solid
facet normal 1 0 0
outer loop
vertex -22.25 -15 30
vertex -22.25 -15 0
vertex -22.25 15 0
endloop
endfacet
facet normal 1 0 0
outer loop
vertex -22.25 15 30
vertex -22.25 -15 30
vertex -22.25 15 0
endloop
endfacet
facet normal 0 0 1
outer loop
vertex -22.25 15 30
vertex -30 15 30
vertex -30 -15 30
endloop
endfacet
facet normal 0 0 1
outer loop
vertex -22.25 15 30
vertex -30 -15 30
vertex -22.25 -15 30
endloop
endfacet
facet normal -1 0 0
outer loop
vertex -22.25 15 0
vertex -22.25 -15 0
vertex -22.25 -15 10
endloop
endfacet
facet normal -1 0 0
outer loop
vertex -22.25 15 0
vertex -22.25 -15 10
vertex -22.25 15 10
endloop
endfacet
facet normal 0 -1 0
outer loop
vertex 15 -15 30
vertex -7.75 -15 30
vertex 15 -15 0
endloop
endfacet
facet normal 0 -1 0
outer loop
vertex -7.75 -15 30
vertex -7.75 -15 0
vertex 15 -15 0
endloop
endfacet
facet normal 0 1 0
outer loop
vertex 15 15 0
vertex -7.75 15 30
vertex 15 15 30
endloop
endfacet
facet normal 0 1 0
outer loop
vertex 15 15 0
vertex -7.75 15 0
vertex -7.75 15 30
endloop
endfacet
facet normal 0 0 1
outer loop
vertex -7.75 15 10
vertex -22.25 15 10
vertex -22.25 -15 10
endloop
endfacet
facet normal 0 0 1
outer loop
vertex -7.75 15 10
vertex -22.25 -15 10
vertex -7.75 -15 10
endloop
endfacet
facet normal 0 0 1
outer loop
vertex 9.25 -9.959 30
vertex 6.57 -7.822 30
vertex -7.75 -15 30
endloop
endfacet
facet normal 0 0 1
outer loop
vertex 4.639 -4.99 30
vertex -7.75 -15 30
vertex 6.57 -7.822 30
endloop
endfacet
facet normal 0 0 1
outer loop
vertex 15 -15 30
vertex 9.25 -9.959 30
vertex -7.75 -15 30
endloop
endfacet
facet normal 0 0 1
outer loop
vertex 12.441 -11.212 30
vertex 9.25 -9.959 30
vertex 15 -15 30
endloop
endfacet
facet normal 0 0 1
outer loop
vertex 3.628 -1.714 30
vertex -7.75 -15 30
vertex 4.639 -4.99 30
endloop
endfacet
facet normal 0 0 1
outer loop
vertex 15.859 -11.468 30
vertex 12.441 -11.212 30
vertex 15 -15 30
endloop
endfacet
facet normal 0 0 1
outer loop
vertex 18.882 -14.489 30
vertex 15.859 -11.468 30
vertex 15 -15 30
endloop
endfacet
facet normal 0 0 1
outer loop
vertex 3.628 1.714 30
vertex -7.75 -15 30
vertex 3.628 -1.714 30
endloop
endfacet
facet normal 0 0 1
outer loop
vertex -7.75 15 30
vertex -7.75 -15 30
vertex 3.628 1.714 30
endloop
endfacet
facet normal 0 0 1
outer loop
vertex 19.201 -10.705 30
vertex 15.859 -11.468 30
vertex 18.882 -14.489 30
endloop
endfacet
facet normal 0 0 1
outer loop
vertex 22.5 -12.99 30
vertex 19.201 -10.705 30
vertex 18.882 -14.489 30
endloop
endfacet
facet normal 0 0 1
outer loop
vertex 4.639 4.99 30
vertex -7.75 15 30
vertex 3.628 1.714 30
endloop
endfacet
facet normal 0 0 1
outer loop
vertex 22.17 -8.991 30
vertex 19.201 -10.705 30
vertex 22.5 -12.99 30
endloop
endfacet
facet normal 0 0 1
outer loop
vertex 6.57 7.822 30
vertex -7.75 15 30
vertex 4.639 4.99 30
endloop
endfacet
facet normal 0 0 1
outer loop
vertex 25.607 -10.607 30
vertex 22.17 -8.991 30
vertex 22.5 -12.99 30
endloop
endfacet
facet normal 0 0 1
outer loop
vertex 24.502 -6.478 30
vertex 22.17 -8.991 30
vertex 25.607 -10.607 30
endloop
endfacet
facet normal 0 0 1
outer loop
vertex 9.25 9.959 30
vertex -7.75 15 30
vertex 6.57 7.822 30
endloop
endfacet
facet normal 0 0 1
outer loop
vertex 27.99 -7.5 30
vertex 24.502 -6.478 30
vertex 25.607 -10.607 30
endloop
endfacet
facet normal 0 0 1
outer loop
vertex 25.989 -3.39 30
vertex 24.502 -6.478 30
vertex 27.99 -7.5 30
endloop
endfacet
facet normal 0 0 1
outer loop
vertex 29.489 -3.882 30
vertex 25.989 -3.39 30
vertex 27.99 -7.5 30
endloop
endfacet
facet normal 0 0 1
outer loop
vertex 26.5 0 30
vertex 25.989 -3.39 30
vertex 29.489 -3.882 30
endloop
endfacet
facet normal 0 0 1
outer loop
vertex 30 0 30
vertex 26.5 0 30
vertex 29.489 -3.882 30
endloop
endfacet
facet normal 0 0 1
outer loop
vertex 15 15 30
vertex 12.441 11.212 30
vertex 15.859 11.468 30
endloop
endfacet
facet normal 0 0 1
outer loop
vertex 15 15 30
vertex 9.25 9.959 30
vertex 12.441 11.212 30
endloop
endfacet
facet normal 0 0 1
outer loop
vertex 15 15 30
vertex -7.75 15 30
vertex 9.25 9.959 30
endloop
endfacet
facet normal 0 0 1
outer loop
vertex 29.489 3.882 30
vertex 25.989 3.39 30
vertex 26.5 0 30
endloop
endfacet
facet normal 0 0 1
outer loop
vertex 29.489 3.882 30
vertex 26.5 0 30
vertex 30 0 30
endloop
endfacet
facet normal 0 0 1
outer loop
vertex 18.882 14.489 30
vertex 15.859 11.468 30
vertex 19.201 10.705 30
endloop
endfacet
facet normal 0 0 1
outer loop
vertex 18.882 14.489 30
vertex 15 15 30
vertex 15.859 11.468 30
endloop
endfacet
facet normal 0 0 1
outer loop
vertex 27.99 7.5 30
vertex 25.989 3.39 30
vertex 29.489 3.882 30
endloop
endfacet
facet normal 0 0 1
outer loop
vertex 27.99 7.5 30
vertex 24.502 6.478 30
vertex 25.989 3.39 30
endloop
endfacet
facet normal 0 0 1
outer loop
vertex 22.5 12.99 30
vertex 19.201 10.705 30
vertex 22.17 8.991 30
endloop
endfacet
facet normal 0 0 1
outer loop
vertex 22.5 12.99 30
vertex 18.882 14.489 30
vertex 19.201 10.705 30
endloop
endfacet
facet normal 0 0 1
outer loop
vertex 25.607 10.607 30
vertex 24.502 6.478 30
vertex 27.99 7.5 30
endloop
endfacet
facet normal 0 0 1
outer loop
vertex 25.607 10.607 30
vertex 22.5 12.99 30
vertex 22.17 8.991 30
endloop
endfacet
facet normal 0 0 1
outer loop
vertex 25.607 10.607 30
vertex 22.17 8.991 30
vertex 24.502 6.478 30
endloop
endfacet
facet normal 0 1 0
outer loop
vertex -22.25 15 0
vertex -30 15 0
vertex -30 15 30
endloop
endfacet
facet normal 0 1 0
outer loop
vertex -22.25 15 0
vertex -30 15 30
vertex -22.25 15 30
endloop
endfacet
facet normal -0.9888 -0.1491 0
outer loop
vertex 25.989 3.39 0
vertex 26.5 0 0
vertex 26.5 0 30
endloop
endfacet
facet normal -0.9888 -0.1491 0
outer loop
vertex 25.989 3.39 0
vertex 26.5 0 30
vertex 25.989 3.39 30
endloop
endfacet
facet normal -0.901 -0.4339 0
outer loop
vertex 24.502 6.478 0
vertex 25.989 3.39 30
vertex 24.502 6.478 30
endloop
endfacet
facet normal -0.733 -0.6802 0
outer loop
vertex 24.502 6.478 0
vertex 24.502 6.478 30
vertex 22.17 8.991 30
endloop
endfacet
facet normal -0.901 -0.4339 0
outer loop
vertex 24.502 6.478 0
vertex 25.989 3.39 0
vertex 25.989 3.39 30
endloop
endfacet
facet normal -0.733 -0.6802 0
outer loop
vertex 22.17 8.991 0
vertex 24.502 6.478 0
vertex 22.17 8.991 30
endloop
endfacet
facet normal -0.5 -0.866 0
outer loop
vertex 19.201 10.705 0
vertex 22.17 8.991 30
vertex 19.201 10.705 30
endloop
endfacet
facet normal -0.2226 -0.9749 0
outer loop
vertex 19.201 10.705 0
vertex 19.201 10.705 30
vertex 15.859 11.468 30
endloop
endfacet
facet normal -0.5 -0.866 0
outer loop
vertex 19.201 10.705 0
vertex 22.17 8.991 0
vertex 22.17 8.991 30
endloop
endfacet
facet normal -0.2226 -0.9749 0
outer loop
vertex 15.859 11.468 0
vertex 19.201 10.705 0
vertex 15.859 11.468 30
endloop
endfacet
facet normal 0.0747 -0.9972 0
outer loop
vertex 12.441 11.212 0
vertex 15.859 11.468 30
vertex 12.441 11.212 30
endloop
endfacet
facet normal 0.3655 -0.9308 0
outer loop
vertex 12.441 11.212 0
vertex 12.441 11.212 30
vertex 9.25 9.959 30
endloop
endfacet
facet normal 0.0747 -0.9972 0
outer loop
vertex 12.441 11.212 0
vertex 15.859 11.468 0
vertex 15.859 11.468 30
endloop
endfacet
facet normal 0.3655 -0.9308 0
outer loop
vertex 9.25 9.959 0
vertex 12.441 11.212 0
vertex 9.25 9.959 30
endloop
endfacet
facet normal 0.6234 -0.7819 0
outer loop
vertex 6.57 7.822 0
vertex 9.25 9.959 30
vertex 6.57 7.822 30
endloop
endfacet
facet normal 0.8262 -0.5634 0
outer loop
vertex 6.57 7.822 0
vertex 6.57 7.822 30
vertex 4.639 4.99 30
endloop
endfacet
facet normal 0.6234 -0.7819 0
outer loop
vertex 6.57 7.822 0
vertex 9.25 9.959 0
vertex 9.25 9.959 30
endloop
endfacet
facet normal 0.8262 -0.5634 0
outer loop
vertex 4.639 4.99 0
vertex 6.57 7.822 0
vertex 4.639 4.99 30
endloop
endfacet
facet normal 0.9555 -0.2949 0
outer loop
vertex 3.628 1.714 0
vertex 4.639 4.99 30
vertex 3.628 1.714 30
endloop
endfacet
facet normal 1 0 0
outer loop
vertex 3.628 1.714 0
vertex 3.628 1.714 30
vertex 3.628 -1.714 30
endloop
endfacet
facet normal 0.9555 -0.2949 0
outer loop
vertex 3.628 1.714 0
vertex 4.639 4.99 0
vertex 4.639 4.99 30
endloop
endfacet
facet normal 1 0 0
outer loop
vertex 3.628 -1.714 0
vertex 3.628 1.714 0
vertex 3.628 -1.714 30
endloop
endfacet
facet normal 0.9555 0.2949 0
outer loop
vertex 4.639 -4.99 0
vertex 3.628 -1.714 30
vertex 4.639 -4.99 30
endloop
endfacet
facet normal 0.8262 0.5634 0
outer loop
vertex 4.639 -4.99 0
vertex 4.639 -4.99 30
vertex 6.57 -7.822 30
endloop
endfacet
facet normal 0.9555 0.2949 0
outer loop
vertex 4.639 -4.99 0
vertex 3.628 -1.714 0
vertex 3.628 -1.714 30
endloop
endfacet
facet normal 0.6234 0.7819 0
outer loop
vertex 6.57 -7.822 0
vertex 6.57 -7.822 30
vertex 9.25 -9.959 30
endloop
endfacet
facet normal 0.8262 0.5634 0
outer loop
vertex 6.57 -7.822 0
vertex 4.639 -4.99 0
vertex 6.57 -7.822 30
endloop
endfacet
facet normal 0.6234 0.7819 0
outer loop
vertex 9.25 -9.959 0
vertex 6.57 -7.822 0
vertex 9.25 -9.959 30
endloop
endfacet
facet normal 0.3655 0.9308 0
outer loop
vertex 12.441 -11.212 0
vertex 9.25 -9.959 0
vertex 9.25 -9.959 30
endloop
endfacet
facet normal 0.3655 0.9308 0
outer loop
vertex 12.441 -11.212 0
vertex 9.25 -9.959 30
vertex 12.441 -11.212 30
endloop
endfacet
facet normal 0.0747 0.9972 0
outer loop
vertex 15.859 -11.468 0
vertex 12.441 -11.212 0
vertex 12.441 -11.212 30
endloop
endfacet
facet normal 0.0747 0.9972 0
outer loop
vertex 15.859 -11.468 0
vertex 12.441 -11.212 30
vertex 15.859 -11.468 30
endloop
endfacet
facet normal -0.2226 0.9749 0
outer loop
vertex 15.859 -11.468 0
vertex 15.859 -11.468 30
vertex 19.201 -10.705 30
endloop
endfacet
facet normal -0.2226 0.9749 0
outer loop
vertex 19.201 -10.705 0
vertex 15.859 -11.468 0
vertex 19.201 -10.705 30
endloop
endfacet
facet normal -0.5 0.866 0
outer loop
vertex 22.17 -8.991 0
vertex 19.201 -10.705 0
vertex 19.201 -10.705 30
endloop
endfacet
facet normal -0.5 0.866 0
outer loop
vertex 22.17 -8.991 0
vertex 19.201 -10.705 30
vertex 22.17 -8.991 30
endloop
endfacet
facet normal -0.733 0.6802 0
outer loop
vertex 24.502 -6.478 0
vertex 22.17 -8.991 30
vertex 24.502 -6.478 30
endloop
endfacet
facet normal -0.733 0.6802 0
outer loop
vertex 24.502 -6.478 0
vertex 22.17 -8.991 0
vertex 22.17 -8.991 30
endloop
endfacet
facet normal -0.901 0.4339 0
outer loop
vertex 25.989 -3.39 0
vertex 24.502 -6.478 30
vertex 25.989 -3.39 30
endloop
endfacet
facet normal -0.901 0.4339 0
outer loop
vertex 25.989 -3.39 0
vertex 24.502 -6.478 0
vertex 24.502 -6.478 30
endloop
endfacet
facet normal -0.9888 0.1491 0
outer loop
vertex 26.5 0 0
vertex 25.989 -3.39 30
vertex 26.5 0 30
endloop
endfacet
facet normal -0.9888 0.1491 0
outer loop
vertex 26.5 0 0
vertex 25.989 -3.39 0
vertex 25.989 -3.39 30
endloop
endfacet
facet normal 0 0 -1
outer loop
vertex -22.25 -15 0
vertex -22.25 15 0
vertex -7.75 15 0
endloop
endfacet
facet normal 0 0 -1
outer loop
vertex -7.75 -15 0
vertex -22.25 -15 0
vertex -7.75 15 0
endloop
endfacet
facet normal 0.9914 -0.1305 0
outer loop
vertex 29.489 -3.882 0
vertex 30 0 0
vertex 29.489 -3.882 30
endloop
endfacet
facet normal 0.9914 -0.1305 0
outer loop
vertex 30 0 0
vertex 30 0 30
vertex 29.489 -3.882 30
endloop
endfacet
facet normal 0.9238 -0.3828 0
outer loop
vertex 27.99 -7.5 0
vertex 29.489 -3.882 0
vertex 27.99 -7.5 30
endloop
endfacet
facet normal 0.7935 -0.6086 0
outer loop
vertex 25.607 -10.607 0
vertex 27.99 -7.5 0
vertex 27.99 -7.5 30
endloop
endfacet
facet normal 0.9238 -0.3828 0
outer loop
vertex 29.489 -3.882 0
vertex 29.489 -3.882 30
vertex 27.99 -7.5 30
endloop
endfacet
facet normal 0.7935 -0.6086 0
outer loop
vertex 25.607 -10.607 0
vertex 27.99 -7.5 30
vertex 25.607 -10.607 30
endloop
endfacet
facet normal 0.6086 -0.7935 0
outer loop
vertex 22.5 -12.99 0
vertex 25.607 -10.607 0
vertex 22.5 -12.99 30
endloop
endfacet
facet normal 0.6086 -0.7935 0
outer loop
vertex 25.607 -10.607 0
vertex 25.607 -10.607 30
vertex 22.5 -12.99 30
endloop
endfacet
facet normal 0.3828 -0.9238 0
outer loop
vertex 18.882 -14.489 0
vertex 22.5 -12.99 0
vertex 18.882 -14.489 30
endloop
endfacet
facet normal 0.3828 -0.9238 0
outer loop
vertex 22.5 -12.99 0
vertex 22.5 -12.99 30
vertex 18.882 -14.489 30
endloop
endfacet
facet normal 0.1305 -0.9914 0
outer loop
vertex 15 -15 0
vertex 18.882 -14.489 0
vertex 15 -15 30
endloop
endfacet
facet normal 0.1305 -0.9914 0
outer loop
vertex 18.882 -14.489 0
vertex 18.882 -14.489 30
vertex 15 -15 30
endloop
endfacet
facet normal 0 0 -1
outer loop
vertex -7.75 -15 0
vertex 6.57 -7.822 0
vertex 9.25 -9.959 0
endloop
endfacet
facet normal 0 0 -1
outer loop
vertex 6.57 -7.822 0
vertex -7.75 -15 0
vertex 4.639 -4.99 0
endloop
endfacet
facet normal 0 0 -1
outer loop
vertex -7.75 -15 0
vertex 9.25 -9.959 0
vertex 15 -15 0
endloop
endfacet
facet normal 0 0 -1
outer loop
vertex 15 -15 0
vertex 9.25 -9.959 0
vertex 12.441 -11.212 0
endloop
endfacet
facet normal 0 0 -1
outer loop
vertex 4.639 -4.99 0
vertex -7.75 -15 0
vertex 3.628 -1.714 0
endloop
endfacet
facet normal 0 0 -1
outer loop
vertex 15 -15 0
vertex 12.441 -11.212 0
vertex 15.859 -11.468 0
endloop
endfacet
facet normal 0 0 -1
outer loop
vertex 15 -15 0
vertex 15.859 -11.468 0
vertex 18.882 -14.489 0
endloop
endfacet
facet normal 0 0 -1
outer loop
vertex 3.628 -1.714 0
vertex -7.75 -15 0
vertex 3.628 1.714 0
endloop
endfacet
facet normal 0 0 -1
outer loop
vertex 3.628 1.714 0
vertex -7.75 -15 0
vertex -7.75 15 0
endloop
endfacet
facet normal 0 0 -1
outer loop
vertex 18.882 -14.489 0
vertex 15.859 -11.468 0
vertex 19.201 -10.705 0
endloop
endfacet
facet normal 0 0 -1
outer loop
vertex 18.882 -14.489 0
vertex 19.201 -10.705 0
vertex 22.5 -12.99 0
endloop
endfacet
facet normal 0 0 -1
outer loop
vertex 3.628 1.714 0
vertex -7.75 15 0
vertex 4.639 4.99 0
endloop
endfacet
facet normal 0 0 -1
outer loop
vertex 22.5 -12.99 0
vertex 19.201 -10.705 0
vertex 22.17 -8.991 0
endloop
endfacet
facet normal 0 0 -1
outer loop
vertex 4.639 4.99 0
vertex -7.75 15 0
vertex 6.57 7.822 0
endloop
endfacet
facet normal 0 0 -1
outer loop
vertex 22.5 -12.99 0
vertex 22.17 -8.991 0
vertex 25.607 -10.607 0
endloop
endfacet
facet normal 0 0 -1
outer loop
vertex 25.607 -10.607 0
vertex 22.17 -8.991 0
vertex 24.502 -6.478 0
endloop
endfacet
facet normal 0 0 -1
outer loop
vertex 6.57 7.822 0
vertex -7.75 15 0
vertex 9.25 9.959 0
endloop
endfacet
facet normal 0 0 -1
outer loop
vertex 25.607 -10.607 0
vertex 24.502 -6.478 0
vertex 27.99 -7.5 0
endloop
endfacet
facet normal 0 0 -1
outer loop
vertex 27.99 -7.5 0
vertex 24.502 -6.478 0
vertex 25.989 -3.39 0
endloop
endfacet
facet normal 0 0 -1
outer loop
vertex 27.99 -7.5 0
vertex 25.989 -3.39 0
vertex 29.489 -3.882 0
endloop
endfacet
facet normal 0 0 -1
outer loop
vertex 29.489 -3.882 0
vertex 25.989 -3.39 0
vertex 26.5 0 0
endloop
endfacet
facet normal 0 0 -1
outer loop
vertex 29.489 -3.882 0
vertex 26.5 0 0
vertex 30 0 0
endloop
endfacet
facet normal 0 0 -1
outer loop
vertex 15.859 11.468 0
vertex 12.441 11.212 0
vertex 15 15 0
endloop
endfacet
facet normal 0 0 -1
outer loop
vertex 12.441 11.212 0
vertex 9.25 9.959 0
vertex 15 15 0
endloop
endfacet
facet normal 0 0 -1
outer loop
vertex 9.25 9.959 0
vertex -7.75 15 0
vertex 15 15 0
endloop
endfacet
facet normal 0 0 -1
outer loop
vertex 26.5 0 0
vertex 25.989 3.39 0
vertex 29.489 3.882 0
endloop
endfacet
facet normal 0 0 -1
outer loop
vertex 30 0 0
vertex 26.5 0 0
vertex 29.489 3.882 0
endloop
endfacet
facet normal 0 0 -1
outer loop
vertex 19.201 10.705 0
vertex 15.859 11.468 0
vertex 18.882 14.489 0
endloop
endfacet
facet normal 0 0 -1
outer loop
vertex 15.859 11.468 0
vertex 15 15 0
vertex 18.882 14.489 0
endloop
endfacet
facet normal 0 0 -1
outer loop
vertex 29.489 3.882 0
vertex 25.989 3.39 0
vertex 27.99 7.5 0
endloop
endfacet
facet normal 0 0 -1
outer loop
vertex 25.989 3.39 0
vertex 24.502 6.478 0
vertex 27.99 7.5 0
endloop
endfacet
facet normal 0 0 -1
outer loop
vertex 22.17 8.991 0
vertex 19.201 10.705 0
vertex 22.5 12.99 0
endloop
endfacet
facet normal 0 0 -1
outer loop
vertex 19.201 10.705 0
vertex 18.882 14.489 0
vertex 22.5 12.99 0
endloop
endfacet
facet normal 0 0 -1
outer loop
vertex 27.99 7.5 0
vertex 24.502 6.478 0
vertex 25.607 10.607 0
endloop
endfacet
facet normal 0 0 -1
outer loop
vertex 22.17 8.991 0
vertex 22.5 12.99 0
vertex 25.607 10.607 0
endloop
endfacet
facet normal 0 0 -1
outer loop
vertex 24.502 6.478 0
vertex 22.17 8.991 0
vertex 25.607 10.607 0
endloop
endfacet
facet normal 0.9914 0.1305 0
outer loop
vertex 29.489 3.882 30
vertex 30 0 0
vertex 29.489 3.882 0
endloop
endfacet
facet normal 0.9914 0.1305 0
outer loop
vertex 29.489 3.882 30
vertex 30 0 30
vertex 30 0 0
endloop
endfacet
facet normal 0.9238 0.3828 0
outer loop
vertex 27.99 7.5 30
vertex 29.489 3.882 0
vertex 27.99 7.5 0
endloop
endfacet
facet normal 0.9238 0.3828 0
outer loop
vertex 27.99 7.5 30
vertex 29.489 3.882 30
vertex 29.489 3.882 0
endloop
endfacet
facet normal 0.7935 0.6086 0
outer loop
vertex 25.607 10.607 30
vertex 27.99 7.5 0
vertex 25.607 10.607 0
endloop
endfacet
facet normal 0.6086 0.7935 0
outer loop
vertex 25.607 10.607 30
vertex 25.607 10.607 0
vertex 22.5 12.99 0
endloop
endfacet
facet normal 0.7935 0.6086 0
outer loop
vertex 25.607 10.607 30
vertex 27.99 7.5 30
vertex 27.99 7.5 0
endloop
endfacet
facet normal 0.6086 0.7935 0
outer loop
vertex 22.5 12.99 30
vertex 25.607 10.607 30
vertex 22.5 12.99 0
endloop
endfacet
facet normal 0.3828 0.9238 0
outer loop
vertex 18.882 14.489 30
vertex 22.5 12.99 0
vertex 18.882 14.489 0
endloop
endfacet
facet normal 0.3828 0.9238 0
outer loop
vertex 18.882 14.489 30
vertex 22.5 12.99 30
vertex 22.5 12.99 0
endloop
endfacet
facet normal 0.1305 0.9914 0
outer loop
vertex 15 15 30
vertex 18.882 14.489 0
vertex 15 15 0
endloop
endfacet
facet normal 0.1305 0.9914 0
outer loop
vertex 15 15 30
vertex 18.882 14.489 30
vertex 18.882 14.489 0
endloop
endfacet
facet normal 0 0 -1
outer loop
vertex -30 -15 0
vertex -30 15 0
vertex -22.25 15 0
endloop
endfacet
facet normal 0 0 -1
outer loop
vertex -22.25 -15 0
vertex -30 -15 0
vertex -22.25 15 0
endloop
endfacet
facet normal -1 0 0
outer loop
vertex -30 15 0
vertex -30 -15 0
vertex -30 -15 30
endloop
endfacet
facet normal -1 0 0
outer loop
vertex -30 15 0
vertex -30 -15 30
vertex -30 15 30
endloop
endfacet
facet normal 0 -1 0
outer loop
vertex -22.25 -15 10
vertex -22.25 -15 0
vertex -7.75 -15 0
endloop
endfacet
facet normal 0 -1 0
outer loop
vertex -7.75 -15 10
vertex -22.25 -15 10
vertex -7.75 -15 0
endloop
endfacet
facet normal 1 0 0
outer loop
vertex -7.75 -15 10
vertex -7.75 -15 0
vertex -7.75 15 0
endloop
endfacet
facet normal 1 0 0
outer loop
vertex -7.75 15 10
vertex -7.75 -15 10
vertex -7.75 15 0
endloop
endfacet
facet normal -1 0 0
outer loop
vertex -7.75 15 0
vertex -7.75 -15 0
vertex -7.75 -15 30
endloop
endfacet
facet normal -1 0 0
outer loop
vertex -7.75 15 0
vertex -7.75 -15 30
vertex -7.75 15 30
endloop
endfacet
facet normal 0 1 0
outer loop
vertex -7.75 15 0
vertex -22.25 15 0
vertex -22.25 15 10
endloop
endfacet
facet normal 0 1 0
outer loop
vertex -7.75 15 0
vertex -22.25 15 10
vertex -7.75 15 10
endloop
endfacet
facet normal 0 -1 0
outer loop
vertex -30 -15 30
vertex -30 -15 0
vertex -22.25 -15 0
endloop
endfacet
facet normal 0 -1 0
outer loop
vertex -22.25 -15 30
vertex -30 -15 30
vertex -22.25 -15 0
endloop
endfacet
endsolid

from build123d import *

# Parameters (mm, degrees)
F0_W     = 30
F0_H     = 30
F0_R     = 11.5
F1_DEPTH = 30
F0_W_2   = 7.75
F2_DEPTH = 30
F0_W_3   = 14.5
F3_DEPTH = 10
F4_R     = 14.99999


# Not quite as in the source:
# - a fillet or chamfer is up to 0.001 mm smaller than in the source, because OpenCascade refuses the exact size


with BuildPart() as f1:
    # F0 (on Top) → F1 (new body)
    with BuildSketch(Plane.XY):
        with Locations((15, 0)):
            Rectangle(F0_W, F0_H)
        with Locations((15, 0)):
            Circle(F0_R, mode=Mode.SUBTRACT)
    extrude(amount=F1_DEPTH)

    # F0 (on Top) → F2, piece 2 (join)
    with BuildSketch(Plane.XY):
        with Locations((-3.875, 0)):
            Rectangle(F0_W_2, F0_H)
    extrude(amount=F2_DEPTH)

    # F4 (radius 15 in the source; OpenCascade refuses exactly that, so slightly less here)
    f4_edges = [f1.edges().sort_by_distance(p)[0] for p in [
        (30, -15, 15),
        (30, 15, 15),
    ]]
    fillet(f4_edges, radius=F4_R)


with BuildPart() as f2:
    # F0 (on Top) → F2 (new body)
    with BuildSketch(Plane.XY):
        with Locations((-26.125, 0)):
            Rectangle(F0_W_2, F0_H)
    extrude(amount=F2_DEPTH)


with BuildPart() as f3:
    # F0 (on Top) → F3 (new body)
    with BuildSketch(Plane.XY):
        with Locations((-15, 0)):
            Rectangle(F0_W_3, F0_H)
    extrude(amount=F3_DEPTH)


solid = Compound([f1.part, f2.part, f3.part])
